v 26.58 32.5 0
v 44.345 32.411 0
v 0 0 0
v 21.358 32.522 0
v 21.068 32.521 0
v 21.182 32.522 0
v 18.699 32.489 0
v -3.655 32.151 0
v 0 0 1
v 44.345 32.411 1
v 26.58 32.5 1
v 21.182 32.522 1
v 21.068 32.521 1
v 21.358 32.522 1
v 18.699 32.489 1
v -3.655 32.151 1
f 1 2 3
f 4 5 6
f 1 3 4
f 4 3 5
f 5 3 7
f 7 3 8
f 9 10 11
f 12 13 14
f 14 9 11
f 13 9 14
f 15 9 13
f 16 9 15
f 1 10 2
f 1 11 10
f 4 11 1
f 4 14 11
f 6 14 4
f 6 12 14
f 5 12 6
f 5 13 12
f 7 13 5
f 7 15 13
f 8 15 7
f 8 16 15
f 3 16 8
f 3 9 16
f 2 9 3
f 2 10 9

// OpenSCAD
// Generated by SolidPython 1.1.3 on 2024-05-19 23:35:49


linear_extrude(height = 1) {
	polygon(points = [[0, 0], [44.3451109375, 32.4113804687], [44.2624843750, 32.4117921875], [44.1798578125, 32.4122039062], [44.0972312500, 32.4126156250], [44.0146046875, 32.4130273438], [43.9319781250, 32.4134390625], [43.8493515625, 32.4138507813], [43.7667250000, 32.4142625000], [43.6840984375, 32.4146742187], [43.6014718750, 32.4150859375], [43.5188453125, 32.4154976562], [43.4362187500, 32.4159093750], [43.3535921875, 32.4163210937], [43.2709656250, 32.4167328125], [43.1883390625, 32.4171445313], [43.1057125000, 32.4175562500], [43.0230859375, 32.4179679688], [42.9404593750, 32.4183796875], [42.8578328125, 32.4187914063], [42.7752062500, 32.4192031250], [42.6925796875, 32.4196148437], [42.6099531250, 32.4200265625], [42.5273265625, 32.4204382813], [42.4447000000, 32.4208500000], [42.3620734375, 32.4212617188], [42.2794468750, 32.4216734375], [42.1968203125, 32.4220851563], [42.1141937500, 32.4224968750], [42.0315671875, 32.4229085937], [41.9489406250, 32.4233203125], [41.8663140625, 32.4237320312], [41.7836875000, 32.4241437500], [41.7010609375, 32.4245554688], [41.6184343750, 32.4249671875], [41.5358078125, 32.4253789063], [41.4531812500, 32.4257906250], [41.3705546875, 32.4262023437], [41.2879281250, 32.4266140625], [41.2053015625, 32.4270257812], [41.1226750000, 32.4274375000], [41.0400484375, 32.4278492187], [40.9574218750, 32.4282609375], [40.8747953125, 32.4286726563], [40.7921687500, 32.4290843750], [40.7095421875, 32.4294960937], [40.6269156250, 32.4299078125], [40.5442890625, 32.4303195312], [40.4616625000, 32.4307312500], [40.3790359375, 32.4311429687], [40.2964093750, 32.4315546875], [40.2137828125, 32.4319664062], [40.1311562500, 32.4323781250], [40.0485296875, 32.4327898438], [39.9659031250, 32.4332015625], [39.8832765625, 32.4336132813], [39.8006500000, 32.4340250000], [39.7180234375, 32.4344367187], [39.6353968750, 32.4348484375], [39.5527703125, 32.4352601562], [39.4701437500, 32.4356718750], [39.3875171875, 32.4360835937], [39.3048906250, 32.4364953125], [39.2222640625, 32.4369070313], [39.1396375000, 32.4373187500], [39.0570109375, 32.4377304688], [38.9743843750, 32.4381421875], [38.8917578125, 32.4385539063], [38.8091312500, 32.4389656250], [38.7265046875, 32.4393773437], [38.6438781250, 32.4397890625], [38.5612515625, 32.4402007812], [38.4786250000, 32.4406125000], [38.3959984375, 32.4410242188], [38.3133718750, 32.4414359375], [38.2307453125, 32.4418476563], [38.1481187500, 32.4422593750], [38.0654921875, 32.4426710937], [37.9828656250, 32.4430828125], [37.9002390625, 32.4434945312], [37.8176125000, 32.4439062500], [37.7349859375, 32.4443179687], [37.6523593750, 32.4447296875], [37.5697328125, 32.4451414063], [37.4871062500, 32.4455531250], [37.4044796875, 32.4459648437], [37.3218531250, 32.4463765625], [37.2392265625, 32.4467882812], [37.1566000000, 32.4472000000], [37.0739734375, 32.4476117187], [36.9913468750, 32.4480234375], [36.9087203125, 32.4484351562], [36.8260937500, 32.4488468750], [36.7434671875, 32.4492585937], [36.6608406250, 32.4496703125], [36.5782140625, 32.4500820312], [36.4955875000, 32.4504937500], [36.4129609375, 32.4509054687], [36.3303343750, 32.4513171875], [36.2477078125, 32.4517289062], [36.1650812500, 32.4521406250], [36.0824546875, 32.4525523437], [35.9998281250, 32.4529640625], [35.9172015625, 32.4533757813], [35.8345750000, 32.4537875000], [35.7519484375, 32.4541992187], [35.6693218750, 32.4546109375], [35.5866953125, 32.4550226562], [35.5040687500, 32.4554343750], [35.4214421875, 32.4558460937], [35.3388156250, 32.4562578125], [35.2561890625, 32.4566695313], [35.1735625000, 32.4570812500], [35.0909359375, 32.4574929688], [35.0083093750, 32.4579046875], [34.9256828125, 32.4583164063], [34.8430562500, 32.4587281250], [34.7604296875, 32.4591398437], [34.6778031250, 32.4595515625], [34.5951765625, 32.4599632812], [34.5125500000, 32.4603750000], [34.4299234375, 32.4607867188], [34.3472968750, 32.4611984375], [34.2646703125, 32.4616101563], [34.1820437500, 32.4620218750], [34.0994171875, 32.4624335937], [34.0167906250, 32.4628453125], [33.9341640625, 32.4632570312], [33.8515375000, 32.4636687500], [33.7689109375, 32.4640804687], [33.6862843750, 32.4644921875], [33.6036578125, 32.4649039063], [33.5210312500, 32.4653156250], [33.4384046875, 32.4657273437], [33.3557781250, 32.4661390625], [33.2731515625, 32.4665507812], [33.1905250000, 32.4669625000], [33.1078984375, 32.4673742187], [33.0252718750, 32.4677859375], [32.9426453125, 32.4681976562], [32.8600187500, 32.4686093750], [32.7773921875, 32.4690210937], [32.6947656250, 32.4694328125], [32.6121390625, 32.4698445312], [32.5295125000, 32.4702562500], [32.4468859375, 32.4706679687], [32.3642593750, 32.4710796875], [32.2816328125, 32.4714914062], [32.1990062500, 32.4719031250], [32.1163796875, 32.4723148437], [32.0337531250, 32.4727265625], [31.9511265625, 32.4731382813], [31.8685000000, 32.4735500000], [31.7858734375, 32.4739617187], [31.7032468750, 32.4743734375], [31.6206203125, 32.4747851562], [31.5379937500, 32.4751968750], [31.4553671875, 32.4756085937], [31.3727406250, 32.4760203125], [31.2901140625, 32.4764320312], [31.2074875000, 32.4768437500], [31.1248609375, 32.4772554688], [31.0422343750, 32.4776671875], [30.9596078125, 32.4780789063], [30.8769812500, 32.4784906250], [30.7943546875, 32.4789023437], [30.7117281250, 32.4793140625], [30.6291015625, 32.4797257812], [30.5464750000, 32.4801375000], [30.4638484375, 32.4805492187], [30.3812218750, 32.4809609375], [30.2985953125, 32.4813726563], [30.2159687500, 32.4817843750], [30.1333421875, 32.4821960937], [30.0507156250, 32.4826078125], [29.9680890625, 32.4830195312], [29.8854625000, 32.4834312500], [29.8028359375, 32.4838429687], [29.7202093750, 32.4842546875], [29.6375828125, 32.4846664062], [29.5549562500, 32.4850781250], [29.4723296875, 32.4854898437], [29.3897031250, 32.4859015625], [29.3070765625, 32.4863132812], [29.2244500000, 32.4867250000], [29.1418234375, 32.4871367187], [29.0591968750, 32.4875484375], [28.9765703125, 32.4879601562], [28.8939437500, 32.4883718750], [28.8113171875, 32.4887835937], [28.7286906250, 32.4891953125], [28.6460640625, 32.4896070312], [28.5634375000, 32.4900187500], [28.4808109375, 32.4904304687], [28.3981843750, 32.4908421875], [28.3155578125, 32.4912539062], [28.2329312500, 32.4916656250], [28.1503046875, 32.4920773437], [28.0676781250, 32.4924890625], [27.9850515625, 32.4929007813], [27.9024250000, 32.4933125000], [27.8197984375, 32.4937242187], [27.7371718750, 32.4941359375], [27.6545453125, 32.4945476562], [27.5719187500, 32.4949593750], [27.4892921875, 32.4953710937], [27.4066656250, 32.4957828125], [27.3240390625, 32.4961945312], [27.2414125000, 32.4966062500], [27.1587859375, 32.4970179688], [27.0761593750, 32.4974296875], [26.9935328125, 32.4978414063], [26.9109062500, 32.4982531250], [26.8282796875, 32.4986648437], [26.7456531250, 32.4990765625], [26.6630265625, 32.4994882812], [26.5804000000, 32.4999000000], [26.4987937500, 32.5002406250], [26.4171875000, 32.5005812500], [26.3355812500, 32.5009218750], [26.2539750000, 32.5012625000], [26.1723687500, 32.5016031250], [26.0907625000, 32.5019437500], [26.0091562500, 32.5022843750], [25.9275500000, 32.5026250000], [25.8459437500, 32.5029656250], [25.7643375000, 32.5033062500], [25.6827312500, 32.5036468750], [25.6011250000, 32.5039875000], [25.5195187500, 32.5043281250], [25.4379125000, 32.5046687500], [25.3563062500, 32.5050093750], [25.2747000000, 32.5053500000], [25.1930937500, 32.5056906250], [25.1114875000, 32.5060312500], [25.0298812500, 32.5063718750], [24.9482750000, 32.5067125000], [24.8666687500, 32.5070531250], [24.7850625000, 32.5073937500], [24.7034562500, 32.5077343750], [24.6218500000, 32.5080750000], [24.5402437500, 32.5084156250], [24.4586375000, 32.5087562500], [24.3770312500, 32.5090968750], [24.2954250000, 32.5094375000], [24.2138187500, 32.5097781250], [24.1322125000, 32.5101187500], [24.0506062500, 32.5104593750], [23.9690000000, 32.5108000000], [23.8873937500, 32.5111406250], [23.8057875000, 32.5114812500], [23.7241812500, 32.5118218750], [23.6425750000, 32.5121625000], [23.5609687500, 32.5125031250], [23.4793625000, 32.5128437500], [23.3977562500, 32.5131843750], [23.3161500000, 32.5135250000], [23.2345437500, 32.5138656250], [23.1529375000, 32.5142062500], [23.0713312500, 32.5145468750], [22.9897250000, 32.5148875000], [22.9081187500, 32.5152281250], [22.8265125000, 32.5155687500], [22.7449062500, 32.5159093750], [22.6633000000, 32.5162500000], [22.5816937500, 32.5165906250], [22.5000875000, 32.5169312500], [22.4184812500, 32.5172718750], [22.3368750000, 32.5176125000], [22.2552687500, 32.5179531250], [22.1736625000, 32.5182937500], [22.0920562500, 32.5186343750], [22.0104500000, 32.5189750000], [21.9288437500, 32.5193156250], [21.8472375000, 32.5196562500], [21.7656312500, 32.5199968750], [21.6840250000, 32.5203375000], [21.6024187500, 32.5206781250], [21.5208125000, 32.5210187500], [21.4392062500, 32.5213593750], [21.3576000000, 32.5217000000], [21.2696500000, 32.5217000000], [21.1817000000, 32.5217000000], [21.1249500000, 32.5213000000], [21.0682000000, 32.5209000000], [20.9941625000, 32.5199125000], [20.9201250000, 32.5189250000], [20.8460875000, 32.5179375000], [20.7720500000, 32.5169500000], [20.6980125000, 32.5159625000], [20.6239750000, 32.5149750000], [20.5499375000, 32.5139875000], [20.4759000000, 32.5130000000], [20.4018625000, 32.5120125000], [20.3278250000, 32.5110250000], [20.2537875000, 32.5100375000], [20.1797500000, 32.5090500000], [20.1057125000, 32.5080625000], [20.0316750000, 32.5070750000], [19.9576375000, 32.5060875000], [19.8836000000, 32.5051000000], [19.8095625000, 32.5041125000], [19.7355250000, 32.5031250000], [19.6614875000, 32.5021375000], [19.5874500000, 32.5011500000], [19.5134125000, 32.5001625000], [19.4393750000, 32.4991750000], [19.3653375000, 32.4981875000], [19.2913000000, 32.4972000000], [19.2172625000, 32.4962125000], [19.1432250000, 32.4952250000], [19.0691875000, 32.4942375000], [18.9951500000, 32.4932500000], [18.9211125000, 32.4922625000], [18.8470750000, 32.4912750000], [18.7730375000, 32.4902875000], [18.6990000000, 32.4893000000], [18.6418281250, 32.4884355469], [18.5846562500, 32.4875710937], [18.5274843750, 32.4867066406], [18.4703125000, 32.4858421875], [18.4131406250, 32.4849777344], [18.3559687500, 32.4841132813], [18.2987968750, 32.4832488281], [18.2416250000, 32.4823843750], [18.1844531250, 32.4815199219], [18.1272812500, 32.4806554688], [18.0701093750, 32.4797910156], [18.0129375000, 32.4789265625], [17.9557656250, 32.4780621094], [17.8985937500, 32.4771976563], [17.8414218750, 32.4763332031], [17.7842500000, 32.4754687500], [17.7270781250, 32.4746042969], [17.6699062500, 32.4737398438], [17.6127343750, 32.4728753906], [17.5555625000, 32.4720109375], [17.4983906250, 32.4711464844], [17.4412187500, 32.4702820313], [17.3840468750, 32.4694175781], [17.3268750000, 32.4685531250], [17.2697031250, 32.4676886719], [17.2125312500, 32.4668242187], [17.1553593750, 32.4659597656], [17.0981875000, 32.4650953125], [17.0410156250, 32.4642308594], [16.9838437500, 32.4633664063], [16.9266718750, 32.4625019531], [16.8695000000, 32.4616375000], [16.8123281250, 32.4607730469], [16.7551562500, 32.4599085938], [16.6979843750, 32.4590441406], [16.6408125000, 32.4581796875], [16.5836406250, 32.4573152344], [16.5264687500, 32.4564507813], [16.4692968750, 32.4555863281], [16.4121250000, 32.4547218750], [16.3549531250, 32.4538574219], [16.2977812500, 32.4529929688], [16.2406093750, 32.4521285156], [16.1834375000, 32.4512640625], [16.1262656250, 32.4503996094], [16.0690937500, 32.4495351563], [16.0119218750, 32.4486707031], [15.9547500000, 32.4478062500], [15.8975781250, 32.4469417969], [15.8404062500, 32.4460773437], [15.7832343750, 32.4452128906], [15.7260625000, 32.4443484375], [15.6688906250, 32.4434839844], [15.6117187500, 32.4426195313], [15.5545468750, 32.4417550781], [15.4973750000, 32.4408906250], [15.4402031250, 32.4400261719], [15.3830312500, 32.4391617188], [15.3258593750, 32.4382972656], [15.2686875000, 32.4374328125], [15.2115156250, 32.4365683594], [15.1543437500, 32.4357039063], [15.0971718750, 32.4348394531], [15.0400000000, 32.4339750000], [14.9828281250, 32.4331105469], [14.9256562500, 32.4322460938], [14.8684843750, 32.4313816406], [14.8113125000, 32.4305171875], [14.7541406250, 32.4296527344], [14.6969687500, 32.4287882813], [14.6397968750, 32.4279238281], [14.5826250000, 32.4270593750], [14.5254531250, 32.4261949219], [14.4682812500, 32.4253304687], [14.4111093750, 32.4244660156], [14.3539375000, 32.4236015625], [14.2967656250, 32.4227371094], [14.2395937500, 32.4218726563], [14.1824218750, 32.4210082031], [14.1252500000, 32.4201437500], [14.0680781250, 32.4192792969], [14.0109062500, 32.4184148437], [13.9537343750, 32.4175503906], [13.8965625000, 32.4166859375], [13.8393906250, 32.4158214844], [13.7822187500, 32.4149570313], [13.7250468750, 32.4140925781], [13.6678750000, 32.4132281250], [13.6107031250, 32.4123636719], [13.5535312500, 32.4114992188], [13.4963593750, 32.4106347656], [13.4391875000, 32.4097703125], [13.3820156250, 32.4089058594], [13.3248437500, 32.4080414062], [13.2676718750, 32.4071769531], [13.2105000000, 32.4063125000], [13.1533281250, 32.4054480469], [13.0961562500, 32.4045835937], [13.0389843750, 32.4037191406], [12.9818125000, 32.4028546875], [12.9246406250, 32.4019902344], [12.8674687500, 32.4011257813], [12.8102968750, 32.4002613281], [12.7531250000, 32.3993968750], [12.6959531250, 32.3985324219], [12.6387812500, 32.3976679687], [12.5816093750, 32.3968035156], [12.5244375000, 32.3959390625], [12.4672656250, 32.3950746094], [12.4100937500, 32.3942101563], [12.3529218750, 32.3933457031], [12.2957500000, 32.3924812500], [12.2385781250, 32.3916167969], [12.1814062500, 32.3907523438], [12.1242343750, 32.3898878906], [12.0670625000, 32.3890234375], [12.0098906250, 32.3881589844], [11.9527187500, 32.3872945312], [11.8955468750, 32.3864300781], [11.8383750000, 32.3855656250], [11.7812031250, 32.3847011719], [11.7240312500, 32.3838367187], [11.6668593750, 32.3829722656], [11.6096875000, 32.3821078125], [11.5525156250, 32.3812433594], [11.4953437500, 32.3803789063], [11.4381718750, 32.3795144531], [11.3810000000, 32.3786500000], [11.3238281250, 32.3777855469], [11.2666562500, 32.3769210937], [11.2094843750, 32.3760566406], [11.1523125000, 32.3751921875], [11.0951406250, 32.3743277344], [11.0379687500, 32.3734632813], [10.9807968750, 32.3725988281], [10.9236250000, 32.3717343750], [10.8664531250, 32.3708699219], [10.8092812500, 32.3700054688], [10.7521093750, 32.3691410156], [10.6949375000, 32.3682765625], [10.6377656250, 32.3674121094], [10.5805937500, 32.3665476562], [10.5234218750, 32.3656832031], [10.4662500000, 32.3648187500], [10.4090781250, 32.3639542969], [10.3519062500, 32.3630898437], [10.2947343750, 32.3622253906], [10.2375625000, 32.3613609375], [10.1803906250, 32.3604964844], [10.1232187500, 32.3596320313], [10.0660468750, 32.3587675781], [10.0088750000, 32.3579031250], [9.9517031250, 32.3570386719], [9.8945312500, 32.3561742187], [9.8373593750, 32.3553097656], [9.7801875000, 32.3544453125], [9.7230156250, 32.3535808594], [9.6658437500, 32.3527164063], [9.6086718750, 32.3518519531], [9.5515000000, 32.3509875000], [9.4943281250, 32.3501230469], [9.4371562500, 32.3492585938], [9.3799843750, 32.3483941406], [9.3228125000, 32.3475296875], [9.2656406250, 32.3466652344], [9.2084687500, 32.3458007812], [9.1512968750, 32.3449363281], [9.0941250000, 32.3440718750], [9.0369531250, 32.3432074219], [8.9797812500, 32.3423429687], [8.9226093750, 32.3414785156], [8.8654375000, 32.3406140625], [8.8082656250, 32.3397496094], [8.7510937500, 32.3388851563], [8.6939218750, 32.3380207031], [8.6367500000, 32.3371562500], [8.5795781250, 32.3362917969], [8.5224062500, 32.3354273437], [8.4652343750, 32.3345628906], [8.4080625000, 32.3336984375], [8.3508906250, 32.3328339844], [8.2937187500, 32.3319695313], [8.2365468750, 32.3311050781], [8.1793750000, 32.3302406250], [8.1222031250, 32.3293761719], [8.0650312500, 32.3285117188], [8.0078593750, 32.3276472656], [7.9506875000, 32.3267828125], [7.8935156250, 32.3259183594], [7.8363437500, 32.3250539062], [7.7791718750, 32.3241894531], [7.7220000000, 32.3233250000], [7.6648281250, 32.3224605469], [7.6076562500, 32.3215960937], [7.5504843750, 32.3207316406], [7.4933125000, 32.3198671875], [7.4361406250, 32.3190027344], [7.3789687500, 32.3181382813], [7.3217968750, 32.3172738281], [7.2646250000, 32.3164093750], [7.2074531250, 32.3155449219], [7.1502812500, 32.3146804687], [7.0931093750, 32.3138160156], [7.0359375000, 32.3129515625], [6.9787656250, 32.3120871094], [6.9215937500, 32.3112226563], [6.8644218750, 32.3103582031], [6.8072500000, 32.3094937500], [6.7500781250, 32.3086292969], [6.6929062500, 32.3077648438], [6.6357343750, 32.3069003906], [6.5785625000, 32.3060359375], [6.5213906250, 32.3051714844], [6.4642187500, 32.3043070312], [6.4070468750, 32.3034425781], [6.3498750000, 32.3025781250], [6.2927031250, 32.3017136719], [6.2355312500, 32.3008492187], [6.1783593750, 32.2999847656], [6.1211875000, 32.2991203125], [6.0640156250, 32.2982558594], [6.0068437500, 32.2973914063], [5.9496718750, 32.2965269531], [5.8925000000, 32.2956625000], [5.8353281250, 32.2947980469], [5.7781562500, 32.2939335937], [5.7209843750, 32.2930691406], [5.6638125000, 32.2922046875], [5.6066406250, 32.2913402344], [5.5494687500, 32.2904757813], [5.4922968750, 32.2896113281], [5.4351250000, 32.2887468750], [5.3779531250, 32.2878824219], [5.3207812500, 32.2870179687], [5.2636093750, 32.2861535156], [5.2064375000, 32.2852890625], [5.1492656250, 32.2844246094], [5.0920937500, 32.2835601562], [5.0349218750, 32.2826957031], [4.9777500000, 32.2818312500], [4.9205781250, 32.2809667969], [4.8634062500, 32.2801023437], [4.8062343750, 32.2792378906], [4.7490625000, 32.2783734375], [4.6918906250, 32.2775089844], [4.6347187500, 32.2766445312], [4.5775468750, 32.2757800781], [4.5203750000, 32.2749156250], [4.4632031250, 32.2740511719], [4.4060312500, 32.2731867187], [4.3488593750, 32.2723222656], [4.2916875000, 32.2714578125], [4.2345156250, 32.2705933594], [4.1773437500, 32.2697289063], [4.1201718750, 32.2688644531], [4.0630000000, 32.2680000000], [4.0058281250, 32.2671355469], [3.9486562500, 32.2662710937], [3.8914843750, 32.2654066406], [3.8343125000, 32.2645421875], [3.7771406250, 32.2636777344], [3.7199687500, 32.2628132813], [3.6627968750, 32.2619488281], [3.6056250000, 32.2610843750], [3.5484531250, 32.2602199219], [3.4912812500, 32.2593554688], [3.4341093750, 32.2584910156], [3.3769375000, 32.2576265625], [3.3197656250, 32.2567621094], [3.2625937500, 32.2558976563], [3.2054218750, 32.2550332031], [3.1482500000, 32.2541687500], [3.0910781250, 32.2533042969], [3.0339062500, 32.2524398438], [2.9767343750, 32.2515753906], [2.9195625000, 32.2507109375], [2.8623906250, 32.2498464844], [2.8052187500, 32.2489820313], [2.7480468750, 32.2481175781], [2.6908750000, 32.2472531250], [2.6337031250, 32.2463886719], [2.5765312500, 32.2455242187], [2.5193593750, 32.2446597656], [2.4621875000, 32.2437953125], [2.4050156250, 32.2429308594], [2.3478437500, 32.2420664063], [2.2906718750, 32.2412019531], [2.2335000000, 32.2403375000], [2.1763281250, 32.2394730469], [2.1191562500, 32.2386085938], [2.0619843750, 32.2377441406], [2.0048125000, 32.2368796875], [1.9476406250, 32.2360152344], [1.8904687500, 32.2351507813], [1.8332968750, 32.2342863281], [1.7761250000, 32.2334218750], [1.7189531250, 32.2325574219], [1.6617812500, 32.2316929688], [1.6046093750, 32.2308285156], [1.5474375000, 32.2299640625], [1.4902656250, 32.2290996094], [1.4330937500, 32.2282351563], [1.3759218750, 32.2273707031], [1.3187500000, 32.2265062500], [1.2615781250, 32.2256417969], [1.2044062500, 32.2247773437], [1.1472343750, 32.2239128906], [1.0900625000, 32.2230484375], [1.0328906250, 32.2221839844], [0.9757187500, 32.2213195313], [0.9185468750, 32.2204550781], [0.8613750000, 32.2195906250], [0.8042031250, 32.2187261719], [0.7470312500, 32.2178617188], [0.6898593750, 32.2169972656], [0.6326875000, 32.2161328125], [0.5755156250, 32.2152683594], [0.5183437500, 32.2144039063], [0.4611718750, 32.2135394531], [0.4040000000, 32.2126750000], [0.3468281250, 32.2118105469], [0.2896562500, 32.2109460938], [0.2324843750, 32.2100816406], [0.1753125000, 32.2092171875], [0.1181406250, 32.2083527344], [0.0609687500, 32.2074882813], [0.0037968750, 32.2066238281], [-0.0533750000, 32.2057593750], [-0.1105468750, 32.2048949219], [-0.1677187500, 32.2040304687], [-0.2248906250, 32.2031660156], [-0.2820625000, 32.2023015625], [-0.3392343750, 32.2014371094], [-0.3964062500, 32.2005726563], [-0.4535781250, 32.1997082031], [-0.5107500000, 32.1988437500], [-0.5679218750, 32.1979792969], [-0.6250937500, 32.1971148438], [-0.6822656250, 32.1962503906], [-0.7394375000, 32.1953859375], [-0.7966093750, 32.1945214844], [-0.8537812500, 32.1936570313], [-0.9109531250, 32.1927925781], [-0.9681250000, 32.1919281250], [-1.0252968750, 32.1910636719], [-1.0824687500, 32.1901992188], [-1.1396406250, 32.1893347656], [-1.1968125000, 32.1884703125], [-1.2539843750, 32.1876058594], [-1.3111562500, 32.1867414063], [-1.3683281250, 32.1858769531], [-1.4255000000, 32.1850125000], [-1.4826718750, 32.1841480469], [-1.5398437500, 32.1832835937], [-1.5970156250, 32.1824191406], [-1.6541875000, 32.1815546875], [-1.7113593750, 32.1806902344], [-1.7685312500, 32.1798257813], [-1.8257031250, 32.1789613281], [-1.8828750000, 32.1780968750], [-1.9400468750, 32.1772324219], [-1.9972187500, 32.1763679688], [-2.0543906250, 32.1755035156], [-2.1115625000, 32.1746390625], [-2.1687343750, 32.1737746094], [-2.2259062500, 32.1729101563], [-2.2830781250, 32.1720457031], [-2.3402500000, 32.1711812500], [-2.3974218750, 32.1703167969], [-2.4545937500, 32.1694523438], [-2.5117656250, 32.1685878906], [-2.5689375000, 32.1677234375], [-2.6261093750, 32.1668589844], [-2.6832812500, 32.1659945312], [-2.7404531250, 32.1651300781], [-2.7976250000, 32.1642656250], [-2.8547968750, 32.1634011719], [-2.9119687500, 32.1625367187], [-2.9691406250, 32.1616722656], [-3.0263125000, 32.1608078125], [-3.0834843750, 32.1599433594], [-3.1406562500, 32.1590789063], [-3.1978281250, 32.1582144531], [-3.2550000000, 32.1573500000], [-3.3121718750, 32.1564855469], [-3.3693437500, 32.1556210937], [-3.4265156250, 32.1547566406], [-3.4836875000, 32.1538921875], [-3.5408593750, 32.1530277344], [-3.5980312500, 32.1521632813], [-3.6552031250, 32.1512988281]]);
}
/***********************************************
*********      SolidPython code:      **********
************************************************
 
import math
import time

from stl import mesh, Dimension

from tkinter import Tk     # from tkinter import Tk for Python 3.x
from tkinter.filedialog import askopenfilename
from mpl_toolkits.mplot3d import art3d
from matplotlib import pyplot as plt
import solid
import os
import ezdxf
import shapely.geometry as sg
import subprocess
from GUI import getSCADPath



def outputSTL(From, To, PATH=getSCADPath()):
    subprocess.Popen(PATH + " -o " + To + " " + From)
    while not os.path.exists(To):
        time.sleep(1)


def get_size(i):
    x_list = [int(a) for a in str(i)]
    return len(x_list)



class Model:
    def __init__(self, model, fileName, location, layer, thickness):
        self.location = location
        self.code = None
        self.fileName = fileName
        self.stl = fileName + ".stl"
        self.layer = layer
        self.thickness = thickness
        self.maxz = (layer+1)*thickness
        self.dxf = fileName + ".dxf"
        self.scad = fileName + ".scad"
        self.model = model
        self.center = None
        self.width = 10
        self.mesh = None
        self.useable_area = None


    def get_code(self):
        max_dim = 0.05
        max_array = 6

        num = int(self.fileName)
        nums = [int(a) for a in str(num)]
        nums.reverse()
        indices = nums
        length = len(nums)

        print(indices)
        t = 0
        i = 0
        cubes = []
        x = 0
        y = 0
        width = 0.01
        while x <= max_dim:
            while y <= max_dim:
                print(indices)
                if nums == []:
                    break
                if indices[0] != 0:
                    cubes.append(solid.translate([x, y, 0])(solid.cube(size=t / 1000 + 0.001)))
                    y += max_dim / (max_array - 1)
                    nums[0] = nums[0] - 1
                else:
                    indices.pop(0)
                    t += 1
                i += 1
            x += max_dim / (max_array - 1)
            y = 0

        outside = solid.translate([-width / 2, -width / 2])(solid.cube(max_dim + (length - 1) / 1000 + 0.001 + width))
        self.code = solid.difference()(outside, cubes)
        self.code = solid.projection(cut=True)(self.code)
        solid.scad_render_to_file(self.code, self.location + "/code.scad")
        outputSTL(From=self.location+"/code.scad", To=self.location+"code.dxf", PATH=getSCADPath())
        # os.system("toSTL.sh renders/code.scad renders/code.dxf")
        return self.location+"/code.dxf"

    def download(self, type):
        if type =="stl":
            print("generating:" + self.location+"/"+ self.fileName+".stl")
            outputSTL(From=self.location+"/"+self.fileName+".scad", To=self.location+"/"+self.fileName+".stl")
            # os.system("toSTL.sh renders/"+ self.fileName+".scad renders/"+ self.fileName+".stl")
        elif type == "dxf":
            outputSTL(From=self.location+"/"+self.fileName+".scad", To=self.location+"/"+self.fileName+".dxf")
            # os.system("toSTL.sh renders/"+ self.fileName+".scad renders/"+ self.fileName+".dxf")

    def render(self):
        solid.scad_render_to_file(self.model, self.location+"/"+ self.fileName+'.scad')
        while not os.path.exists(self.location+"/"+self.fileName+".scad"):
            time.sleep(1)

    def get_points(self):
        doc = ezdxf.readfile(filename=self.location+"/"+ self.fileName+".dxf")
        msp = doc.modelspace()
        i=0
        lists = []
        def helper(e):
            start = [e.dxf.start[0], e.dxf.start[1]]
            end = [e.dxf.end[0], e.dxf.end[1]]
            return [start, end]

        for e in msp.query("LINE"):
            line = helper(e)
            if not lists:
                lists.append([line])
            else:
                if lists[i][len(lists)-1][1] != line[0]:
                    lists.append([line])
                    i+=1
                else:
                    lists[i].append(line)

    def get_points2(self, FILE):
        doc = ezdxf.readfile(filename=FILE)
        msp = doc.modelspace()
        i = 0
        lists = []

        def helper(e):
            start = [e.dxf.start[0], e.dxf.start[1]]
            end = [e.dxf.end[0], e.dxf.end[1]]
            return (start, end)

        for e in msp.query("LINE"):
            line = helper(e)
            if lists==[]:
                lists.append([line])
            else:
                if lists[i][len(lists[i]) - 1][1] != line[0]:
                    lists.append([line])
                    i += 1
                else:
                    lists[i].append(line)
        return lists

    def add_code(self):
        dxf = solid.projection(cut=False)(self.model)
        offset = solid.offset(r=-0.1)(dxf)
        solid.scad_render_to_file(offset, self.location+'/offset.scad')
        os.system("toSTL.sh renders/offset.scad renders/offset.dxf")
        lines = self.get_points2("renders/offset.dxf")
        x = lines[0][0][0][0]
        y = lines[0][0][0][1]
        print(x)
        print(y)
        code = solid.translate([x,y,0])(self.code)
        code = solid.linear_extrude(height=999)(code)
        save = self.model
        self.model = solid.projection()(solid.difference()(self.model, code))
        self.render()
        self.download("dxf")
        self.model = save

    def add_label(self, pos):
        # num = 12
        # minx, maxx, miny, maxy, minz, maxz = self.find_minmax()
        maxz = self.maxz
        # label = solid.linear_extrude(height=(maxz-minz)/3)(solid.text(str(self.fileName), size=0.5, halign="center"))
        # i=minx
        # print("x-len: " + str(maxx-minx))
        # print(i)
        # inc = (maxx-minx)/num
        # while minx <= i <= maxx:
        #     label = solid.union()(solid.translate([i, 0, maxz - 0.2])(solid.linear_extrude(height=(maxz-minz)/3)(solid.text(str(self.fileName), size=0.25, halign="center"))), label)
        #     i += inc
        #
        # l = label
        #
        # i =miny
        # while miny<= i <= maxy:
        #     print("y inc")
        #     l = solid.union()(solid.translate([0, i, 0])(label), l)
        #     i += 0.5
        for i in str(self.fileName):
            cur = pos[0]
            label = solid.translate([pos[0][0], pos[0][1], self.maxz-0.2])(solid.linear_extrude(height=(self.thickness)/3)(solid.text(str(i), size=0.5, halign="center", valign="center")))
            self.model = solid.difference()(self.model, label)
            pos.append(pos.pop(0))
            while abs(cur[0]-pos[0][0])<0.5 and abs(cur[1]-pos[0][1])<0.5:
                pos.append(pos.pop(0))



    def Center(self):

        volume, cog, inertia = self.mesh.get_mass_properties()
        print("Volume                                  = {0}".format(volume))
        print("Position of the center of gravity (COG) = {0}".format(cog))
        m_centered = solid.translate([-cog[0], -cog[1], 0])(
            self.model
        )
        return m_centered

    def find_minmax(self):
        minx = maxx = miny = maxy = minz = maxz = None
        for p in self.mesh.points:
            # p contains (x, y, z)
            if minx is None:
                minx = p[Dimension.X]
                maxx = p[Dimension.X]
                miny = p[Dimension.Y]
                maxy = p[Dimension.Y]
                minz = p[Dimension.Z]
                maxz = p[Dimension.Z]
            else:
                maxx = max(p[Dimension.X], maxx)
                minx = min(p[Dimension.X], minx)
                maxy = max(p[Dimension.Y], maxy)
                miny = min(p[Dimension.Y], miny)
                maxz = max(p[Dimension.Z], maxz)
                minz = min(p[Dimension.Z], minz)
        lenx = maxx - minx
        leny = maxy - miny
        lenz = maxz - minz
        return minx, maxx, miny, maxy, minz, maxz

    # def generate_Mesh(self):
    #     self.mesh = mesh.Mesh.from_file(self.location + "/" + str(int(self.fileName)//8)+ "b.stl")

    def get_top(self):
        top = solid.projection(cut=True)(solid.translate([0,0,-1*self.thickness*(self.layer+1)])(self.model))
        useable_area = solid.offset(r=-0.45)(top)
        self.useable_area = useable_area
        solid.scad_render_to_file(self.useable_area, self.location+'/' + 'toptemp.scad')
        outputSTL(From=self.location+'/' + 'toptemp.scad', To=self.location+"/top"+ self.dxf)

        # os.system("toSTL.sh out/toptemp.scad renders/" + self.fileName + ".dxf")
        dxf = DXF(self.location+"/top"+ self.dxf)
        min_p=dxf.points[0][0]
        points_ordered = dxf.points
        i=0
        while i <= len(dxf.points)+1:
            while math.sqrt((dxf.points[0][0]-dxf.points[1][0])**2+(dxf.points[0][1]-dxf.points[1][1])**2) > 0.1:
                dxf.points.insert(1, [(dxf.points[0][0]+dxf.points[1][0])/2, (dxf.points[0][1]+dxf.points[1][1])/2])
                i = i-1
            dxf.points.append(dxf.points.pop(0))
            i+=1
        for i in range(len(dxf.points)):
            dxf.points.append(dxf.points.pop(0))
            if dxf.points[0][0] < min_p:
                min_p = dxf.points[0][0]
                points_ordered = dxf.points.copy()
        dxf.points = points_ordered.copy()

        print(dxf.points)
        self.add_label(dxf.points)

class DXF:
    def __init__(self, file):
        self.file = file
        self.Lines = []
        self.points = []
        doc = ezdxf.readfile(self.file)
        msp = doc.modelspace()
        for e in msp:
            if e.dxftype() == "LINE":
                self.Lines.append(e)
                self.points.append([e.dxf.start[0], e.dxf.start[1]])
        # self.points.append([self.Lines[-1].dxf.end[0], self.Lines[-1].dxf.end[1]])
        self.area = None
        self.center = None
        self.polygon = sg.Polygon(self.points)

    def get_area(self):
        self.area = self.polygon.area
        return self.area

    def get_center(self):
        x_sum = 0
        y_sum =0
        for i in self.points:
            x_sum += i[0]
            y_sum += i[1]
        x_c = x_sum/len(self.points)
        y_c = y_sum/len(self.points)
        return (x_c, y_c)

    def split(self, maxdim):
        splits = []
        length = 0
        pieces = [[]]
        prev = self.points[0]
        for j in self.points:
            length = length + math.sqrt((prev[0]-j[0])**2+(prev[1]-j[1])**2)
            if length >= maxdim:
                pieces[-1].append(j)
                pieces.append([])
                length = 0
            pieces[-1].append(j)
            prev = j
        for j in pieces:
            j.insert(0, [0,0])
            piece = solid.linear_extrude(height=1)(solid.polygon(j))
            splits.append(piece)
        return splits
    def refine_points(self):
        i=0
        while i <= len(self.points)+1:
            while math.sqrt((self.points[0][0]-self.points[1][0])**2+(self.points[0][1]-self.points[1][1])**2) > 0.1:
                self.points.insert(1, [(self.points[0][0]+self.points[1][0])/2, (self.points[0][1]+self.points[1][1])/2])
                i = i-1
            self.points.append(self.points.pop(0))
            i+=1


if __name__== "__main__":
    test = DXF("C:/Users/Daniel/Documents/repos/Shell_Maker/output/0top_slice.dxf")
    test.refine_points()
    k = test.split(48)
    for i in range(len(k)):
        solid.scad_render_to_file(k[i], str(i) + ".scad")


 
 
************************************************/
